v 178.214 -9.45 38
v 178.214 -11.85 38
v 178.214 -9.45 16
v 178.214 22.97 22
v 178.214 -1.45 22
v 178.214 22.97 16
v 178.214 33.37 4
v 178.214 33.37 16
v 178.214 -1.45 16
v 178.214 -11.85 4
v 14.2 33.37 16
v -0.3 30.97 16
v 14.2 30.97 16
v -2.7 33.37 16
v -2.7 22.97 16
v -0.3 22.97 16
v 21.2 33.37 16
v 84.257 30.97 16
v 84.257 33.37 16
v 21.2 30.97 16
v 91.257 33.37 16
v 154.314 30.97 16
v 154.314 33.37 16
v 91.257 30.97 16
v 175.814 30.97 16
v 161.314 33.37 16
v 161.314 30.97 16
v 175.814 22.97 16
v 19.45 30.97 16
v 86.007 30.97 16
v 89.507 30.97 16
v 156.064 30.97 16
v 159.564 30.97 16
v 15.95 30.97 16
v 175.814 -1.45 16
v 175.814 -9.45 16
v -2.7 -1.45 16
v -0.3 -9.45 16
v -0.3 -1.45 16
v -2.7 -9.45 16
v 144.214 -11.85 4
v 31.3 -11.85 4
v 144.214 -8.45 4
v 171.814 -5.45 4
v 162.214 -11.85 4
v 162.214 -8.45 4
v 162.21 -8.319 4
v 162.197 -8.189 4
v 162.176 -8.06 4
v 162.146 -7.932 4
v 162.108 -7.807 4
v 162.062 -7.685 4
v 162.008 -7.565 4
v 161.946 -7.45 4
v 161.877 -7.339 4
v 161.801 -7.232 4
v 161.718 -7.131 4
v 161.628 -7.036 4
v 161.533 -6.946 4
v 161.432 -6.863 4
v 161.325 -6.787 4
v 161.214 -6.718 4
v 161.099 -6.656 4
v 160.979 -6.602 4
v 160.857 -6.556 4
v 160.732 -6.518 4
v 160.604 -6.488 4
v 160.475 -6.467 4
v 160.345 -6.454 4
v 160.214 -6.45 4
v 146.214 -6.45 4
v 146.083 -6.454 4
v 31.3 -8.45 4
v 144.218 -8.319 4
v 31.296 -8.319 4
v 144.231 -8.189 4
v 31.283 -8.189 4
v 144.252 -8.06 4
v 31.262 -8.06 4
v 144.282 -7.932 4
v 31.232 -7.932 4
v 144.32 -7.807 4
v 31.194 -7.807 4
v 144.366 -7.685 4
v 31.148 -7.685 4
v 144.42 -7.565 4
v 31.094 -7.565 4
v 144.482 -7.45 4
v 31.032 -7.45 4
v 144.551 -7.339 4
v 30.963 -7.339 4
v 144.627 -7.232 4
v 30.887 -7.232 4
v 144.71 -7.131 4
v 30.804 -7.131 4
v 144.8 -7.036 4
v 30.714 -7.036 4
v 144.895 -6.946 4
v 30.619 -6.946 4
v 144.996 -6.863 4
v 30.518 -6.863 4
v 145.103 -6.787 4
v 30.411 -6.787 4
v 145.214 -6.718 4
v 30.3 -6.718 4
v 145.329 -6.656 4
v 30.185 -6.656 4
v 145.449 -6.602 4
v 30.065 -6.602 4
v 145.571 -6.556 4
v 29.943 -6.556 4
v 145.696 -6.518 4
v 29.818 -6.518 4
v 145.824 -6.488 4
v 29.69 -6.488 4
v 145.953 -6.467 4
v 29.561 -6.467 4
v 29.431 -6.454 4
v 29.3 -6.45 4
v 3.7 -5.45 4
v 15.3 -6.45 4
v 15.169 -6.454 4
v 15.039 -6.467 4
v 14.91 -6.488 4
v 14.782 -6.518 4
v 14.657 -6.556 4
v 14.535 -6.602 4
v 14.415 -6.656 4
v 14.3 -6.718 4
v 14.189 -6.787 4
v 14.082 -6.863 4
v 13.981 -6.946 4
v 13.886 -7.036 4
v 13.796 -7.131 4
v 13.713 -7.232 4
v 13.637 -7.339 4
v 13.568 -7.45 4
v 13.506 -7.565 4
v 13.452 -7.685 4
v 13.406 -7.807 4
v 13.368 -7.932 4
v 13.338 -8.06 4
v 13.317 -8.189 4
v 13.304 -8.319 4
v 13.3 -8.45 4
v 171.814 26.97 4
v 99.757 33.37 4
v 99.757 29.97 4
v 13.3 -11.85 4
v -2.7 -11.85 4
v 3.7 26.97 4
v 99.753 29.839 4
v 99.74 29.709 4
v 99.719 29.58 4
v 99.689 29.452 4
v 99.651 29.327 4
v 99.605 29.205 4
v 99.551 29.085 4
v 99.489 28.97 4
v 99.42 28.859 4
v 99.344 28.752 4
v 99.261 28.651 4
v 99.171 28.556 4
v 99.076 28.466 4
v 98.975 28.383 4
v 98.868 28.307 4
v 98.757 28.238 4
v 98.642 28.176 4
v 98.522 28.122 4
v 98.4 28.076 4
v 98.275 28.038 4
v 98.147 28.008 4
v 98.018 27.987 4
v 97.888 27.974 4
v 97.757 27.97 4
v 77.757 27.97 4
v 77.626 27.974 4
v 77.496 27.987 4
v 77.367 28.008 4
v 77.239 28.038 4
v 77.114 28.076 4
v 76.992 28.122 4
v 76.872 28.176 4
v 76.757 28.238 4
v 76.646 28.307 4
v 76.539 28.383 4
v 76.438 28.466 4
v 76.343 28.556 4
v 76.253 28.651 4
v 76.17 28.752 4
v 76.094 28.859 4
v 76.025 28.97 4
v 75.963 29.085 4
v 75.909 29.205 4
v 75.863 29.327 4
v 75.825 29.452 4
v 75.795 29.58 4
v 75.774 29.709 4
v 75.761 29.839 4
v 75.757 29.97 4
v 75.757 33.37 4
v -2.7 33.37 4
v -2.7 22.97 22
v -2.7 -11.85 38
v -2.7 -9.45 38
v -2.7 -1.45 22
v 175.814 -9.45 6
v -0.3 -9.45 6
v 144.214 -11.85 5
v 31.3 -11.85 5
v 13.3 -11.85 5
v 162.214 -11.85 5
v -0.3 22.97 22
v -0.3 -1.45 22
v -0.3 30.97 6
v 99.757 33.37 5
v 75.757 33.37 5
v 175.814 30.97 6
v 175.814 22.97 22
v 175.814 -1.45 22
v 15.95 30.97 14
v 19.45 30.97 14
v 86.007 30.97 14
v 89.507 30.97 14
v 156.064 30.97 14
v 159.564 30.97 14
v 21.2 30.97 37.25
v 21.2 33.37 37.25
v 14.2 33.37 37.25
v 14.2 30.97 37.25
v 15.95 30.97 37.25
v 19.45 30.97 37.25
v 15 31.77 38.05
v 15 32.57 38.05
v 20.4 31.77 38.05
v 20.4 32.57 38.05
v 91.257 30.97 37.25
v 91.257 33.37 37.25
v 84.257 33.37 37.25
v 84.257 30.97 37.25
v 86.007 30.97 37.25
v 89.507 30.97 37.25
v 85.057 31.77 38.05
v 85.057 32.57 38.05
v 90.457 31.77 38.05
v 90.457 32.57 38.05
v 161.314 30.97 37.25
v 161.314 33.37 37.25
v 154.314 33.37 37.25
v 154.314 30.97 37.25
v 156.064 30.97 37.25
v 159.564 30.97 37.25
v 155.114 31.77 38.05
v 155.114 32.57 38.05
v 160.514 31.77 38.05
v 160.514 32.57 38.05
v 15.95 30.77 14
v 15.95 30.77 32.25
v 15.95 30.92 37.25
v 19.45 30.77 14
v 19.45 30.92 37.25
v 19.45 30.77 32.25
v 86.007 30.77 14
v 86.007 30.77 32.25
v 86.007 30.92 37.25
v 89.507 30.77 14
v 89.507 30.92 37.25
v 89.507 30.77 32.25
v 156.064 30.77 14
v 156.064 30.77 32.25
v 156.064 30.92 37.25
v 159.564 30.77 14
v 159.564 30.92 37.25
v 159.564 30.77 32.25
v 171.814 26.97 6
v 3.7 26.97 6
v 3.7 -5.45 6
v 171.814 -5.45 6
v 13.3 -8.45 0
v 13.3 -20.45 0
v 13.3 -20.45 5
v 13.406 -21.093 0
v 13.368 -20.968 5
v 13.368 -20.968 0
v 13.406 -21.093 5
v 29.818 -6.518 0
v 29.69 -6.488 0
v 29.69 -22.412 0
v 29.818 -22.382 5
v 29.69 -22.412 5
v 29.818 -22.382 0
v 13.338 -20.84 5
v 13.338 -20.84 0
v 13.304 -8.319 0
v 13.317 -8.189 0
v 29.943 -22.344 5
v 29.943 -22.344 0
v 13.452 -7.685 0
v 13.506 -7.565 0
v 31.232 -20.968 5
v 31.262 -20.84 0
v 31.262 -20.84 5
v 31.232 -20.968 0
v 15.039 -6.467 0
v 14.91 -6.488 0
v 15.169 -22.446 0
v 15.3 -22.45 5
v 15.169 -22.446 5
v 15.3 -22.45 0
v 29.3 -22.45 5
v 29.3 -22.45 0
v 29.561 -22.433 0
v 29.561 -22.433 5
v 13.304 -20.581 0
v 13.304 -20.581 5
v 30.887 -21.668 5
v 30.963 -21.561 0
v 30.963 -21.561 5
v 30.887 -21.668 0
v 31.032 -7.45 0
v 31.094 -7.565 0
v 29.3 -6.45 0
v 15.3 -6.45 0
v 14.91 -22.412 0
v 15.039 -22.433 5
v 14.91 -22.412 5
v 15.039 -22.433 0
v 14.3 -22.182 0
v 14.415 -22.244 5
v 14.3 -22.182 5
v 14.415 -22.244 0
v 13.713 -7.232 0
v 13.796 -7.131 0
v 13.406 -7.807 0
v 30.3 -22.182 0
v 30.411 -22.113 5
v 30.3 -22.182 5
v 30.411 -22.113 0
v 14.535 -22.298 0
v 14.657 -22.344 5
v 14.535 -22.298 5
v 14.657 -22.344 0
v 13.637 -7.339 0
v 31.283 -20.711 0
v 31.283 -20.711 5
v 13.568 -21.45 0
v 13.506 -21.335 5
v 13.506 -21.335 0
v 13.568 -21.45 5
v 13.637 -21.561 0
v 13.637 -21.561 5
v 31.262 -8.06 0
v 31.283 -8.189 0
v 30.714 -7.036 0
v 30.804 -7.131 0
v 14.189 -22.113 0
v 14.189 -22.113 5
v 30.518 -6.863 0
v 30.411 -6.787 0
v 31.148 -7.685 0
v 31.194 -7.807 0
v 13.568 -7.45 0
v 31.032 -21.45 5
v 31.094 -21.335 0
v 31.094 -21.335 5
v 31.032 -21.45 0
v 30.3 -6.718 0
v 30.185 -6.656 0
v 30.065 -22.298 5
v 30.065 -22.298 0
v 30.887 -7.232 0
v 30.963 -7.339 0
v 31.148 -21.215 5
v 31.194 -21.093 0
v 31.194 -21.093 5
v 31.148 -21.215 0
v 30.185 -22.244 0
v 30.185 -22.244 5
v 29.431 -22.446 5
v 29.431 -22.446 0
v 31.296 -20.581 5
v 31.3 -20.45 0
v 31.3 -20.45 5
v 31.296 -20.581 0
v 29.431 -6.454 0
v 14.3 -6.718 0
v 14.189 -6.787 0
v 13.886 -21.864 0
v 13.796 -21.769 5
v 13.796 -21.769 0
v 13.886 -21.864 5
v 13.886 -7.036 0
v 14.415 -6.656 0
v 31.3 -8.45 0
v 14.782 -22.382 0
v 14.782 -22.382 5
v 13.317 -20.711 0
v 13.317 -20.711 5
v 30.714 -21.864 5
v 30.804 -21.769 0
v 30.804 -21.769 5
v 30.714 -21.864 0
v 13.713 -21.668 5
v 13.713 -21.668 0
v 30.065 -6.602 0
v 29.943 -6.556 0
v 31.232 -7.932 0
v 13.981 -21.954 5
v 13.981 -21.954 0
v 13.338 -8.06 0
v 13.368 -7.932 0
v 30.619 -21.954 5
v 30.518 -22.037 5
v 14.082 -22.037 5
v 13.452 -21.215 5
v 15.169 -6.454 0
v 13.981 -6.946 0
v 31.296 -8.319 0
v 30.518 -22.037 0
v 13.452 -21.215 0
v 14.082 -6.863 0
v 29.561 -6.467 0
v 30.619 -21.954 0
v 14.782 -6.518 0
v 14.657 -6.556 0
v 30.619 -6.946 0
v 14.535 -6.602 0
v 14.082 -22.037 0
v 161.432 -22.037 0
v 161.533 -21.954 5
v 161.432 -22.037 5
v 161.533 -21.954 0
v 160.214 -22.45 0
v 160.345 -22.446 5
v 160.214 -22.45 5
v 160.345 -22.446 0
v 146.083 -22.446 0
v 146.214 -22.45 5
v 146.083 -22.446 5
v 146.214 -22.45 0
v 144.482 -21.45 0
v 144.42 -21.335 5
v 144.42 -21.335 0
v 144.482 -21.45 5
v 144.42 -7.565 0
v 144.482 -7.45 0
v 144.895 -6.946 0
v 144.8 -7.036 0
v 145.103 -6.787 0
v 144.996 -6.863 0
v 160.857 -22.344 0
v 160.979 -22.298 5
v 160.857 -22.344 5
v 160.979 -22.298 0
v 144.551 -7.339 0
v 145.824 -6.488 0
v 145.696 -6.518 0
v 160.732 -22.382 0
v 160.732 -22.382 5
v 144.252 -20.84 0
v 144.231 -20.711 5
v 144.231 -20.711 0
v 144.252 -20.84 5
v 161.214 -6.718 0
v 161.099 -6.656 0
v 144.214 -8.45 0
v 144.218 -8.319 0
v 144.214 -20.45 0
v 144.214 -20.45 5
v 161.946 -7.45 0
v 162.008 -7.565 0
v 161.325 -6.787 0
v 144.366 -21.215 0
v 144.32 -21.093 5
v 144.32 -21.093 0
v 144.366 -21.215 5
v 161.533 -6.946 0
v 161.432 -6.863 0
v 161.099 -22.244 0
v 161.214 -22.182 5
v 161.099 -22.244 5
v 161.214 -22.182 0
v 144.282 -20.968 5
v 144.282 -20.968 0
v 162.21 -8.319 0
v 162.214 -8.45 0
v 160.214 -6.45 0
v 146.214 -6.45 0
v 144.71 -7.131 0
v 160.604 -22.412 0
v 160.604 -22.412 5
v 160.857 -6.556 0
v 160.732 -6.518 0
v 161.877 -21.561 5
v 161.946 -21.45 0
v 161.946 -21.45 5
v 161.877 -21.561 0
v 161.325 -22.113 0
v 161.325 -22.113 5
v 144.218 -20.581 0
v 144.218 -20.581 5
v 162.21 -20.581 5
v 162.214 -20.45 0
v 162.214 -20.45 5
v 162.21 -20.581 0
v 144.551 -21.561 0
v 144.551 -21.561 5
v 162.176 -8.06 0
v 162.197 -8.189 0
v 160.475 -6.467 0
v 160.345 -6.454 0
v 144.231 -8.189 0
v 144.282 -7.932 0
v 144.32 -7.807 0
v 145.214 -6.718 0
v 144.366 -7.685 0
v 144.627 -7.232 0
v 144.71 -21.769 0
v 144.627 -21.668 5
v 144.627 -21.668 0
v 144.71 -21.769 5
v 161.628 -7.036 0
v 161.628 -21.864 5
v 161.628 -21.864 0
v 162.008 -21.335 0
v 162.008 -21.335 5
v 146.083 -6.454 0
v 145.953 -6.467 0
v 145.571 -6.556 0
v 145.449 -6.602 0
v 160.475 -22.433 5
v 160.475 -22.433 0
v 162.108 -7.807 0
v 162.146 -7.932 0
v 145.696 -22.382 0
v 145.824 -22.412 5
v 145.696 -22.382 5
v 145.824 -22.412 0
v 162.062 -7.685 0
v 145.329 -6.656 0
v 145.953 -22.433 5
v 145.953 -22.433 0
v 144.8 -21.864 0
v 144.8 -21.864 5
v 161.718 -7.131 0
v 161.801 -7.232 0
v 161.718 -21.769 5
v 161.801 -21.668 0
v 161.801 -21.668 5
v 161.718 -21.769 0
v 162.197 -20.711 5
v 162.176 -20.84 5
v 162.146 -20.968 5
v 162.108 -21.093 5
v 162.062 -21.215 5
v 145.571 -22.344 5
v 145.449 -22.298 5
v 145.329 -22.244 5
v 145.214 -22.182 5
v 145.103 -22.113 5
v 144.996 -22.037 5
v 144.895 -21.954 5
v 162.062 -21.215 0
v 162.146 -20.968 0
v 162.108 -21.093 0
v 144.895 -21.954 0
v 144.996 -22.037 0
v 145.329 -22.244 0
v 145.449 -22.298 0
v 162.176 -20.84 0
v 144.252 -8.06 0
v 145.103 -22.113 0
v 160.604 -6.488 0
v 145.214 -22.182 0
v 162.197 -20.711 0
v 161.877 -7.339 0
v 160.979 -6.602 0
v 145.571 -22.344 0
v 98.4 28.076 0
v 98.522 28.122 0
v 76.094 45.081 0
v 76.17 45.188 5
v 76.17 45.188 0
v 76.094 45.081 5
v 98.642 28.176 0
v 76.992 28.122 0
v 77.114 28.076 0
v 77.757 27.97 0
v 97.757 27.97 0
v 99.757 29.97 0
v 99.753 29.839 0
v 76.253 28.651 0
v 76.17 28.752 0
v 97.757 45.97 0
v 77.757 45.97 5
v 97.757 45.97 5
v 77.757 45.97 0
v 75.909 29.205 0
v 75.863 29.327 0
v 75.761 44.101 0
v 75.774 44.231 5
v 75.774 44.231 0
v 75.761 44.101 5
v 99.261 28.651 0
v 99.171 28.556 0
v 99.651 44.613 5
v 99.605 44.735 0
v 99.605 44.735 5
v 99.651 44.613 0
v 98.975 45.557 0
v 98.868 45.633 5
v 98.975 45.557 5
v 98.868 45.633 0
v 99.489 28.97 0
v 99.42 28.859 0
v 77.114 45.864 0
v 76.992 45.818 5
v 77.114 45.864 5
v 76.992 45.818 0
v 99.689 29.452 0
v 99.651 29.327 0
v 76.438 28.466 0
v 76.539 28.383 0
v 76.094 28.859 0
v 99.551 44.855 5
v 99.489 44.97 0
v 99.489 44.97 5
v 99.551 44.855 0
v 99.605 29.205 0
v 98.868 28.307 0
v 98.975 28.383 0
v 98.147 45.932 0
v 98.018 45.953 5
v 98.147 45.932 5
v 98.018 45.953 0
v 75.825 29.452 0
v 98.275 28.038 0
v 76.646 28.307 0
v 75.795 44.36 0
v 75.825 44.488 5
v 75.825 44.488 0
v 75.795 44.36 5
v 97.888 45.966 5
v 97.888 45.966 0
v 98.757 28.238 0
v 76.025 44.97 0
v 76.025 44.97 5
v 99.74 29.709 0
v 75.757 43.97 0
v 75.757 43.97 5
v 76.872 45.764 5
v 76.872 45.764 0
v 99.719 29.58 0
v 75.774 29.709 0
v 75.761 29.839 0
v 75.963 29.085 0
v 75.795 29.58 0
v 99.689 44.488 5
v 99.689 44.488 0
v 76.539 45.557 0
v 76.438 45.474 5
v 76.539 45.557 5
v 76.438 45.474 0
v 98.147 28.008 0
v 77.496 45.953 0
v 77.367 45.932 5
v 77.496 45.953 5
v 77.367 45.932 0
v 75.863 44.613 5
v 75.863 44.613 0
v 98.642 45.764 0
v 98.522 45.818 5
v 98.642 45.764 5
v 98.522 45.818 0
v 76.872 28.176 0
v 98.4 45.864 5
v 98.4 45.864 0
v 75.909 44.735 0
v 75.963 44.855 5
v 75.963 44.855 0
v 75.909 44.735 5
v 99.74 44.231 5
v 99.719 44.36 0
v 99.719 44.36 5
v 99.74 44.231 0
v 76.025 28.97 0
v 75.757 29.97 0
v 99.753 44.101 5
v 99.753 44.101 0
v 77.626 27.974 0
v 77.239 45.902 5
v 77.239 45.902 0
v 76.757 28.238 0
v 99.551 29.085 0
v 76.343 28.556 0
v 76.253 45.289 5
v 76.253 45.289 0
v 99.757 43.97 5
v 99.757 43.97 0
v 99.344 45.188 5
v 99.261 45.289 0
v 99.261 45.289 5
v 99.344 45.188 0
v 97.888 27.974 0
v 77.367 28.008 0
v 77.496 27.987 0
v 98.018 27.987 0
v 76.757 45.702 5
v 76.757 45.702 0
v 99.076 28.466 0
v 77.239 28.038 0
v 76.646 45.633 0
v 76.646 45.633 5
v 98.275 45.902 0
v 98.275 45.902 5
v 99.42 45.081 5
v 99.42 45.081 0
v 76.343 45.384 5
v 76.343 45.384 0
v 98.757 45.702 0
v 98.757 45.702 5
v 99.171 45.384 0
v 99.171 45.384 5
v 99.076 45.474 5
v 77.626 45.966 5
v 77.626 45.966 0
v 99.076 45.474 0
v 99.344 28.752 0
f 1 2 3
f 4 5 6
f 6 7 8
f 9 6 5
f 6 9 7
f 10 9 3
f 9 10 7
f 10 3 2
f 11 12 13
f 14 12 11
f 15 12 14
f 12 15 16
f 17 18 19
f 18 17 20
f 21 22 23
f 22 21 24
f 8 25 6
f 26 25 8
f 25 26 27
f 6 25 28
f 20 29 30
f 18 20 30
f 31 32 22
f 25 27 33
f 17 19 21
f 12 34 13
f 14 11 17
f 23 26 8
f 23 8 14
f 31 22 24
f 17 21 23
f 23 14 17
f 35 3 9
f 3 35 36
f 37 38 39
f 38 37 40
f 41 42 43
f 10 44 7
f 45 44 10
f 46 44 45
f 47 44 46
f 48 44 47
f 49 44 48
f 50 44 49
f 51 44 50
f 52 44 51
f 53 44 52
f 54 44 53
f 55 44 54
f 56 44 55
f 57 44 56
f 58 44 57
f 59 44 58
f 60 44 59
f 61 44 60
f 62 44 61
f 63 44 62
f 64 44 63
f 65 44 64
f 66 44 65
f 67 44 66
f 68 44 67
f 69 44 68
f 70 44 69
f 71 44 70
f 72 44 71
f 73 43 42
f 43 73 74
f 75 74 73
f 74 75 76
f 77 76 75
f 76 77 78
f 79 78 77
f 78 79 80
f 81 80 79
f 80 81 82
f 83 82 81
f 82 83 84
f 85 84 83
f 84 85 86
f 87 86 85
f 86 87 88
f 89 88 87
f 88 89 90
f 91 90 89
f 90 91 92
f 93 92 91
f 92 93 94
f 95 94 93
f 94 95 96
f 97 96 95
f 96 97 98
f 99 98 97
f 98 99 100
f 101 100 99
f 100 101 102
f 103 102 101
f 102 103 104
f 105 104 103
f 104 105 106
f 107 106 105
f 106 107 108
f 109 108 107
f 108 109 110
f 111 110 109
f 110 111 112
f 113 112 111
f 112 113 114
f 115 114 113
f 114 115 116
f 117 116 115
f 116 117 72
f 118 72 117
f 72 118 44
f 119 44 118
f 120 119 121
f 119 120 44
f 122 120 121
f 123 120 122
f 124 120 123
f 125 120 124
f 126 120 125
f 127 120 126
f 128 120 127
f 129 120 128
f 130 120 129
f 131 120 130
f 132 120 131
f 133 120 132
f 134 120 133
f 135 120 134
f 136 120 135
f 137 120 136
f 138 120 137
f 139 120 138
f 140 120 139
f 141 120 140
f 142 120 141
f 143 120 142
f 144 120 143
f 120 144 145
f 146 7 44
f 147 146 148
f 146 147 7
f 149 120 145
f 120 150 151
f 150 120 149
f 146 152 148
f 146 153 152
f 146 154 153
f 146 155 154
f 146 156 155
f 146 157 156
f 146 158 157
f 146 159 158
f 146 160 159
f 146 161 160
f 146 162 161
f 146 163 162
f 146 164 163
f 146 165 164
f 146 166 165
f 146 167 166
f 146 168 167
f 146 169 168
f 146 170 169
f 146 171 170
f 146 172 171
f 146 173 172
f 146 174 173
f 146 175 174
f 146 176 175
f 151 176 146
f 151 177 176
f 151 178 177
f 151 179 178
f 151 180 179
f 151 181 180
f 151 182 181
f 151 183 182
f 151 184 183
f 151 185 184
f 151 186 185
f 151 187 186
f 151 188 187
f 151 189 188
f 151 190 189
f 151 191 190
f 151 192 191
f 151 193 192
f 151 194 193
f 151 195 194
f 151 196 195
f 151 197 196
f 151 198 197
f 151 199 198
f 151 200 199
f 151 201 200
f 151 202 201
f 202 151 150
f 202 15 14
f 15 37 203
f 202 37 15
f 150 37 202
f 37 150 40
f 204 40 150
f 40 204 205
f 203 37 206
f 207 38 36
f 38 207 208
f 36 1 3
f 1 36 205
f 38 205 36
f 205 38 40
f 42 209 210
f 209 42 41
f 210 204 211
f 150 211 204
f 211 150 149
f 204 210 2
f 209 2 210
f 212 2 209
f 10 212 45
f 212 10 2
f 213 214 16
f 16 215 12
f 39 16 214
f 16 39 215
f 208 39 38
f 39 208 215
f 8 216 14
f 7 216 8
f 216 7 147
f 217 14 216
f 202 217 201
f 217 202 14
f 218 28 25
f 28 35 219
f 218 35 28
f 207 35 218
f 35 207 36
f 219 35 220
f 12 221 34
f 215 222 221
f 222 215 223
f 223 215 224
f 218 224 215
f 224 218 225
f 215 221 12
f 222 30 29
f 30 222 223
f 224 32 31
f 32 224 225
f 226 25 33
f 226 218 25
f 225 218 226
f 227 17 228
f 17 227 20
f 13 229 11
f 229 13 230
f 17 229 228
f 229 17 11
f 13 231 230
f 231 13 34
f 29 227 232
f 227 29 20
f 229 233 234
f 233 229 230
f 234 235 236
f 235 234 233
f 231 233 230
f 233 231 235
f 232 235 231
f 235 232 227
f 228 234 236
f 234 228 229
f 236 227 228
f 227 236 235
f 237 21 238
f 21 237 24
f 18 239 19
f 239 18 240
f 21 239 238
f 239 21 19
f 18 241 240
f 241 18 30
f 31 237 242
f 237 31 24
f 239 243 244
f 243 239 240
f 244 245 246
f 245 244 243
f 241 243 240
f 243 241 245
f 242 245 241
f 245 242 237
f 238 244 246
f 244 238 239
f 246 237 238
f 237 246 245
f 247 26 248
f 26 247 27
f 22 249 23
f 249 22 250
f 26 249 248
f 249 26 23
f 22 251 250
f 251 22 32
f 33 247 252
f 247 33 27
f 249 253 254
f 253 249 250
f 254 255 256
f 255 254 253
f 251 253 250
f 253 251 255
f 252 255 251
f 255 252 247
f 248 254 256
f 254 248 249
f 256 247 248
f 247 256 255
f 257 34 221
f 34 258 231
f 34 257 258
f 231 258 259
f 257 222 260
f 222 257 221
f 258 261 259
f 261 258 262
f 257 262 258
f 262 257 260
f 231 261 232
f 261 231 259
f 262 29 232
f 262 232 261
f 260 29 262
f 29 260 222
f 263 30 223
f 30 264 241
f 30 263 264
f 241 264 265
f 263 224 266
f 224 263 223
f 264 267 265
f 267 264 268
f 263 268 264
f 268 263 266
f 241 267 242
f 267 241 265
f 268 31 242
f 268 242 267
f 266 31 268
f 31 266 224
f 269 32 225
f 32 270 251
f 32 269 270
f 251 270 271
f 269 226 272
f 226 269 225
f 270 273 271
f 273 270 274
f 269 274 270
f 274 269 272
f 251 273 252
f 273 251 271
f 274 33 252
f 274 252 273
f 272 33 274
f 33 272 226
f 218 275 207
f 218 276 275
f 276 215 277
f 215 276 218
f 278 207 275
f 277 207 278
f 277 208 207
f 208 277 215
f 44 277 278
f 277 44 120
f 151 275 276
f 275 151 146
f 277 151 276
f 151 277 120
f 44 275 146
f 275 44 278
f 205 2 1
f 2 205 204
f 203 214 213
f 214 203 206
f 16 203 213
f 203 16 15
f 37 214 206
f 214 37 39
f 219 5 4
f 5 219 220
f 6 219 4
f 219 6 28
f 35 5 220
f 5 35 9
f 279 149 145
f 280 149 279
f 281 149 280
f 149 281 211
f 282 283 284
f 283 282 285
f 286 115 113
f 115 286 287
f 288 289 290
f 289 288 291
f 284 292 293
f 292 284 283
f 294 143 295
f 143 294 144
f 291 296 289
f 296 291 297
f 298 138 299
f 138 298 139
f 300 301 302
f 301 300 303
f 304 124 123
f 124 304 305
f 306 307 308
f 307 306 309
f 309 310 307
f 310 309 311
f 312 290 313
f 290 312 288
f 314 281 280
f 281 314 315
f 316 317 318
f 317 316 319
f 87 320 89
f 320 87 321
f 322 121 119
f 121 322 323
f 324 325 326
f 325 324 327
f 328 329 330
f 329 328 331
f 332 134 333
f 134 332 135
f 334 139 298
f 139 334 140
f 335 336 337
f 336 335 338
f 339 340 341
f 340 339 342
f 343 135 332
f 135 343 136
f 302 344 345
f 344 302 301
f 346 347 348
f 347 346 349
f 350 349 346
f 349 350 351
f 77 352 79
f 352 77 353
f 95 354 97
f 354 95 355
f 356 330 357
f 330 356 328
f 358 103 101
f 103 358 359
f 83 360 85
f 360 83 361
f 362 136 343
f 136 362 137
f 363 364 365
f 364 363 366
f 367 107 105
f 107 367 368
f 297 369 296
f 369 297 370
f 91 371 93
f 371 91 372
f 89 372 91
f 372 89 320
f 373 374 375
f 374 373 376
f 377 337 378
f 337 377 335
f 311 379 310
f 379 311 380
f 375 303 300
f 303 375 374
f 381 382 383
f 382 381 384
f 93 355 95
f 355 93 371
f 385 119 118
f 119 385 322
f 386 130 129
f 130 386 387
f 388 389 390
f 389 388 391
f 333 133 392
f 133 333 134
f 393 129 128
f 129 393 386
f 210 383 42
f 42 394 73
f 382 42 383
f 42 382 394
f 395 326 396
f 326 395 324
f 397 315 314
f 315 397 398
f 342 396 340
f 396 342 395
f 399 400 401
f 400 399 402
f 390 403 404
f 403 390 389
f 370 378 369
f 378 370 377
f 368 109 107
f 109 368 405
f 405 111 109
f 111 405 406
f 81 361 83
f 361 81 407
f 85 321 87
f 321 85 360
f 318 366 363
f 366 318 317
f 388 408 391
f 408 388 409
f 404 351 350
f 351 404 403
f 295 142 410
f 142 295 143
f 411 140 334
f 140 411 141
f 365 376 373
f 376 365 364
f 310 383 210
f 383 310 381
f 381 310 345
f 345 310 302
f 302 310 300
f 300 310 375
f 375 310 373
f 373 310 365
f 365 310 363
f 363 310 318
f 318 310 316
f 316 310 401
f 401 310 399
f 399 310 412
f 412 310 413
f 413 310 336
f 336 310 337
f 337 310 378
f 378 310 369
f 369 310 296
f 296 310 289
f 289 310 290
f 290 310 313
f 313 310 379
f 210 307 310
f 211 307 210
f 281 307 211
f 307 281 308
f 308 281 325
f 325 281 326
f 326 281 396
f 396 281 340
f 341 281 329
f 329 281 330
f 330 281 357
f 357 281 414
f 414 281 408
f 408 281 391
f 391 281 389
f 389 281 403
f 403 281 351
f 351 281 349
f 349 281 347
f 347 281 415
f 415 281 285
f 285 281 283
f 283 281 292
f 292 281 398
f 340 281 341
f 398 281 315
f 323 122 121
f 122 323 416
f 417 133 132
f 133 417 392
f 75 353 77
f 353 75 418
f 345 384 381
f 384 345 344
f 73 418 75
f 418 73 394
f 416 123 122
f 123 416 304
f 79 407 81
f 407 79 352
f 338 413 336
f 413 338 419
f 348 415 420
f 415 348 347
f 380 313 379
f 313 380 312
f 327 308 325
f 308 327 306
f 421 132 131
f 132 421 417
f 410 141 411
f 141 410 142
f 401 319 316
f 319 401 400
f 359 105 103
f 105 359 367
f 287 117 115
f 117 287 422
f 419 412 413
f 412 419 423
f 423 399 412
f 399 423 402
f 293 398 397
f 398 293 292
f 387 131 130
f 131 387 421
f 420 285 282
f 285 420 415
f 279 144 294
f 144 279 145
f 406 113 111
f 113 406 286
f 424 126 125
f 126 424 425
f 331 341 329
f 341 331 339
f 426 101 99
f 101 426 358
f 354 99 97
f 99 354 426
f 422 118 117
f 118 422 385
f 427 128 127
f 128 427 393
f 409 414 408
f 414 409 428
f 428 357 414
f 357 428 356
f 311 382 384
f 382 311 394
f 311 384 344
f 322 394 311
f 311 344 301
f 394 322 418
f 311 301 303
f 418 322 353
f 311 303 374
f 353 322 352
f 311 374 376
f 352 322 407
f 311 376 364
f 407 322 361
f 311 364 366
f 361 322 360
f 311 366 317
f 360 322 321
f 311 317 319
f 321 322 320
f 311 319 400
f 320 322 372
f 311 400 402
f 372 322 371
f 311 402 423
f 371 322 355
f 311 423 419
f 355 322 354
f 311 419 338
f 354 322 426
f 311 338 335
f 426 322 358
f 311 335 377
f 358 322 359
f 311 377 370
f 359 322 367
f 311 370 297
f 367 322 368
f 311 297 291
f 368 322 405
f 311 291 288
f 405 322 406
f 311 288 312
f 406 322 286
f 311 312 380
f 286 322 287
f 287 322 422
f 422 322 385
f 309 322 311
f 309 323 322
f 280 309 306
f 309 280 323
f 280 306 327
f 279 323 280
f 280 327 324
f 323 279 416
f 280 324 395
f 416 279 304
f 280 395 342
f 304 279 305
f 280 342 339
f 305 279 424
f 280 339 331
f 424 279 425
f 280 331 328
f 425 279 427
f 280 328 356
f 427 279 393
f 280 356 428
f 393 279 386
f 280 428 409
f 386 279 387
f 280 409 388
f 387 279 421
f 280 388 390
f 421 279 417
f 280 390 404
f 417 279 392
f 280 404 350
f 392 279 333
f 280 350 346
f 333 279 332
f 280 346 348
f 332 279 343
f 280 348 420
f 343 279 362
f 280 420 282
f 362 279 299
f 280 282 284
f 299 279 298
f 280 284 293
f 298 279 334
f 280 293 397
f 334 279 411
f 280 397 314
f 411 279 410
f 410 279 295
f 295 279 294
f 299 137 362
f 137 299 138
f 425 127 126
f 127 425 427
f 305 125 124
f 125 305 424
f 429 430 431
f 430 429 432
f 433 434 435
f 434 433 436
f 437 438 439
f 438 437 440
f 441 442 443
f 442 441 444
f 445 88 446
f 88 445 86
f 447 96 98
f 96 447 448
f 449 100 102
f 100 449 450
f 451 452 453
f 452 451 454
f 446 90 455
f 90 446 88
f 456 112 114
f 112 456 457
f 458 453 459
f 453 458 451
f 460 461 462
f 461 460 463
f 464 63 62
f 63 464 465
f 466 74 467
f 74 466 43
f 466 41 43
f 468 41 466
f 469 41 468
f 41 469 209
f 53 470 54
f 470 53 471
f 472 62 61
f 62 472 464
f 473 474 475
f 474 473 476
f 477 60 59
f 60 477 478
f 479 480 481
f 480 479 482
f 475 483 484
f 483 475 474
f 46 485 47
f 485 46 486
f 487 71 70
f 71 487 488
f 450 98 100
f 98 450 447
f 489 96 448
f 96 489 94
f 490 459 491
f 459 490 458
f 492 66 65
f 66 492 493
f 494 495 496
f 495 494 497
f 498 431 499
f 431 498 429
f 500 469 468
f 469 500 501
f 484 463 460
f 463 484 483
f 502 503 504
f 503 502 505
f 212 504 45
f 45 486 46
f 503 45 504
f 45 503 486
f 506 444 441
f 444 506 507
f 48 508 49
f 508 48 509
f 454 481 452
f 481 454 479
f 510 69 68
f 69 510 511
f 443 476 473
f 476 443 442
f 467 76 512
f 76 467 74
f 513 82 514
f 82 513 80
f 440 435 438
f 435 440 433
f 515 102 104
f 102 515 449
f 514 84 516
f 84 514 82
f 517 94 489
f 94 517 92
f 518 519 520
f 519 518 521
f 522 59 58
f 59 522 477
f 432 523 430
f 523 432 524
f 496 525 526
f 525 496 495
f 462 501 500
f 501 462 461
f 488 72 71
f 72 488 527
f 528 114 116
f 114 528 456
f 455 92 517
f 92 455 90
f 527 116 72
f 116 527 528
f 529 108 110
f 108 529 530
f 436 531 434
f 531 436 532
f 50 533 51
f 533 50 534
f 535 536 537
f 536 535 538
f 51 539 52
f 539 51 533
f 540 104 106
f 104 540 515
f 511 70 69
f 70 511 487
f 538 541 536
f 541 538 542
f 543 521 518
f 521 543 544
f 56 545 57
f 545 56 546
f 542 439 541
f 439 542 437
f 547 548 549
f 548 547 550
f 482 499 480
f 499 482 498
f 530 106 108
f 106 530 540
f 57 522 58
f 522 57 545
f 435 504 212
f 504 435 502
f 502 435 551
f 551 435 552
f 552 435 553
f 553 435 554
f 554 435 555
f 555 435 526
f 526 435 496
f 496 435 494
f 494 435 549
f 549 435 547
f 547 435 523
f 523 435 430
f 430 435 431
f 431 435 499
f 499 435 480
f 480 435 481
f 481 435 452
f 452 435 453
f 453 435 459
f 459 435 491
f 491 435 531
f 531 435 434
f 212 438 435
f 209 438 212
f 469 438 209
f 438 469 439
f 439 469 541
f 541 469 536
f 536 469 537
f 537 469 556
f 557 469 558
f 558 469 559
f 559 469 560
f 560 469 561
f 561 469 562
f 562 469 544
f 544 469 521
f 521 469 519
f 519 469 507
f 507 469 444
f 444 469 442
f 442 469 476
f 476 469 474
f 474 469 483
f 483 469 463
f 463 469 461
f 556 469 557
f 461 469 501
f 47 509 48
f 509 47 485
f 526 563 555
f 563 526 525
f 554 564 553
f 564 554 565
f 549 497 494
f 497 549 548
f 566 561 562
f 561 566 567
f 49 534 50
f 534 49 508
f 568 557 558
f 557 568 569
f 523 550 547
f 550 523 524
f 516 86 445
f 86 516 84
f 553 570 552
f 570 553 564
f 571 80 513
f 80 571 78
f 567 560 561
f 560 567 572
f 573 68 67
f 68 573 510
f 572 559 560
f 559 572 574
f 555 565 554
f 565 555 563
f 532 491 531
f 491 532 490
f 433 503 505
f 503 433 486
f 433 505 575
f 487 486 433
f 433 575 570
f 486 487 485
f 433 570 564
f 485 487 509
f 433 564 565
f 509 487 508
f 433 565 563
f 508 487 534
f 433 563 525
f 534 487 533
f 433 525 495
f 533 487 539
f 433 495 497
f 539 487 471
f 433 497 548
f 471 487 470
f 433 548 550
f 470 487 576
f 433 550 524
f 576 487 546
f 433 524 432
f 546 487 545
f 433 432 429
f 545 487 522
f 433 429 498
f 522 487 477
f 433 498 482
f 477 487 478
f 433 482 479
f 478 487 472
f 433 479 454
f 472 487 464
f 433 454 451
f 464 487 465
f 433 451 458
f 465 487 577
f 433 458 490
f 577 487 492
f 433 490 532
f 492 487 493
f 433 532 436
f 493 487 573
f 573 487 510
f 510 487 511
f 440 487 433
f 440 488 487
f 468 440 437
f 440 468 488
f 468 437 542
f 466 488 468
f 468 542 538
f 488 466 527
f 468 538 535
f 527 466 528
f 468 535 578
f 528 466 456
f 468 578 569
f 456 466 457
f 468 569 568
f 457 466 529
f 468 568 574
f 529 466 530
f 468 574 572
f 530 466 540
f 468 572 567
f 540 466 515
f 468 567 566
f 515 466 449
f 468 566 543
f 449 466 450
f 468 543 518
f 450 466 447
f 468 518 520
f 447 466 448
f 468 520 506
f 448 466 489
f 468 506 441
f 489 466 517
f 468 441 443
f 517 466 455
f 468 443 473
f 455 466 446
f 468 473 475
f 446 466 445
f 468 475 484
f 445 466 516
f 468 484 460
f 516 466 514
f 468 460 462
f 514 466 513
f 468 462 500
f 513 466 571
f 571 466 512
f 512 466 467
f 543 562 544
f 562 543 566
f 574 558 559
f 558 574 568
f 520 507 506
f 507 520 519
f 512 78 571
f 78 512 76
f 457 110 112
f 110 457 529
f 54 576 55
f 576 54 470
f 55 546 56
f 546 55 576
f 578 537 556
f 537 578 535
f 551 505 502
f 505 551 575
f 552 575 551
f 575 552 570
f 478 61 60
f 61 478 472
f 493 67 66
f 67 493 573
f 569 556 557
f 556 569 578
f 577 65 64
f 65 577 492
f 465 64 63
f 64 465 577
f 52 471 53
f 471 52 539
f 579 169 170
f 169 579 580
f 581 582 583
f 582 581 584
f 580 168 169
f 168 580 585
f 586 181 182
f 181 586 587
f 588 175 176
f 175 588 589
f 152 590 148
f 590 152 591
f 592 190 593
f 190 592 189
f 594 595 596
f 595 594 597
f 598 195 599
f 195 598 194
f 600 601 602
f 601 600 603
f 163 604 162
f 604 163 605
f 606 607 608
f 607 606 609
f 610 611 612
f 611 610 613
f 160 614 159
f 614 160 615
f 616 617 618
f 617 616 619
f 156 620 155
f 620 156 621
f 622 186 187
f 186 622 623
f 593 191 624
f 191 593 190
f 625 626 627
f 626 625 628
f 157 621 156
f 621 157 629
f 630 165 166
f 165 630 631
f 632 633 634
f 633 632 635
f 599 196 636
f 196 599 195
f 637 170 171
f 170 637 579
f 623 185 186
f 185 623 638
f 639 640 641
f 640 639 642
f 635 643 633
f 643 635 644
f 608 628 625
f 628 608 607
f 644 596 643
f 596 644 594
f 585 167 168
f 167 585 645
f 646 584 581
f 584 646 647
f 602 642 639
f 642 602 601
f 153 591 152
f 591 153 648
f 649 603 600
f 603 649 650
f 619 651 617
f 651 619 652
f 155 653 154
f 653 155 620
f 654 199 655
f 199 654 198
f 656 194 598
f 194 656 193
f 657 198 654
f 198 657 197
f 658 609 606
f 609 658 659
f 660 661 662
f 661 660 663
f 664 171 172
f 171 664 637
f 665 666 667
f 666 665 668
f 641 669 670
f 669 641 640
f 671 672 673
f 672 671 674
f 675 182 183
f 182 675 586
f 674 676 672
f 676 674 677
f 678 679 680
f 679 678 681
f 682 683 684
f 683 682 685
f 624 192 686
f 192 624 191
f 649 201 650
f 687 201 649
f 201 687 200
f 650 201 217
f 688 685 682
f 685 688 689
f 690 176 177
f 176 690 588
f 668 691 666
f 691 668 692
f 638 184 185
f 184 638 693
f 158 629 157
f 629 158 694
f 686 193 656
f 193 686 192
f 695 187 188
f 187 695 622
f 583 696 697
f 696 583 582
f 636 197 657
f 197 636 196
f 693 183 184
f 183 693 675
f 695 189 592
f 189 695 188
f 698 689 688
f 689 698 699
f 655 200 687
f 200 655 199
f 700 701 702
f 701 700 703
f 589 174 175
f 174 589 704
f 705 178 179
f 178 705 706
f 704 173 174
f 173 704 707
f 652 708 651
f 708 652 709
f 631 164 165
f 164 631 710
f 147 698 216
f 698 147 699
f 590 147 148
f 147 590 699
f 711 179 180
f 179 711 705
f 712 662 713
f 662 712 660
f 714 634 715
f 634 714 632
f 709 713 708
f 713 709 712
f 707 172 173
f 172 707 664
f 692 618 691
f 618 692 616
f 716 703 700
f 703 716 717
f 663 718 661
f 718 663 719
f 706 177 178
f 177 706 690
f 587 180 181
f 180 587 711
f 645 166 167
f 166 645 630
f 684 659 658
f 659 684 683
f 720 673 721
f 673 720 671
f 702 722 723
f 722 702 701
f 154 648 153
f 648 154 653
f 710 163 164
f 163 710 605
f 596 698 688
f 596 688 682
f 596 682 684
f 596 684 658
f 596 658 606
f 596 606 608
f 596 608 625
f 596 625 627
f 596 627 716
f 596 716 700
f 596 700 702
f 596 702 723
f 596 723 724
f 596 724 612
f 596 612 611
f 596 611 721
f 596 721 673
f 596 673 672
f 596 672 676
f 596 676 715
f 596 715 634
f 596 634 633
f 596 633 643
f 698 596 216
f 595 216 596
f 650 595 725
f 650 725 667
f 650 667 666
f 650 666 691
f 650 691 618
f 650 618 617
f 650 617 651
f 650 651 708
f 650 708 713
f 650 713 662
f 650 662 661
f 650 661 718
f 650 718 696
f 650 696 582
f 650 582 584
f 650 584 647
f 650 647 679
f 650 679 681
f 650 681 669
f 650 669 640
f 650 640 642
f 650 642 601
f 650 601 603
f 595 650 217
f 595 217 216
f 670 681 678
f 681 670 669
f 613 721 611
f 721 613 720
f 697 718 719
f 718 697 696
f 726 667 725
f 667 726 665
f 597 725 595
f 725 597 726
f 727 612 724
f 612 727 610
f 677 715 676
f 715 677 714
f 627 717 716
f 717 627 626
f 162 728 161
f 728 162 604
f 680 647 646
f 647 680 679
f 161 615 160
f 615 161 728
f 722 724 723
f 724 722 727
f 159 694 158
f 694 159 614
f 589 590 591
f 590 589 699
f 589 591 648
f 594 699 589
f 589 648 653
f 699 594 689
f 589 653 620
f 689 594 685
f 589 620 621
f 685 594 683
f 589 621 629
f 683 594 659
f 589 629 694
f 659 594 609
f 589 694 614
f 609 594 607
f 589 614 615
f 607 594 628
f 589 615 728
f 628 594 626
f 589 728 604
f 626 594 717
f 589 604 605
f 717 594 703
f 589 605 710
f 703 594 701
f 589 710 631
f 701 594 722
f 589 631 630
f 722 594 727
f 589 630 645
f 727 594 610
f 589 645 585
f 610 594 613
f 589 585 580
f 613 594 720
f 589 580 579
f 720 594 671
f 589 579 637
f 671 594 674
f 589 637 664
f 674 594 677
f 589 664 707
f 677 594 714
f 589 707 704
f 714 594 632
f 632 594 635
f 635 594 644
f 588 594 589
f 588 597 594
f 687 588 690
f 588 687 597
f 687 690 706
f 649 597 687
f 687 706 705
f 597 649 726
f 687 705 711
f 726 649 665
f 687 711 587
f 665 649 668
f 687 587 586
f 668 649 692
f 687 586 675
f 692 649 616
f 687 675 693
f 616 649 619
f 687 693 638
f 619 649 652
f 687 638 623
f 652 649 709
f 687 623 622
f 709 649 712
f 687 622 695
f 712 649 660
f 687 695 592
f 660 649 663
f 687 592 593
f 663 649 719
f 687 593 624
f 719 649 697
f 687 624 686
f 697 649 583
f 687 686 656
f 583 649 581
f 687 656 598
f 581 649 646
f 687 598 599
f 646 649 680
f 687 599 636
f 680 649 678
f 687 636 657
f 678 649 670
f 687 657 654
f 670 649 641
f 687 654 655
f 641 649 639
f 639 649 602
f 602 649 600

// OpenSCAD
// DOUBLE TAKE FRAMES DESIGN RELEASE
// DTF_RELEASE: 2.0.4
// Released: 2026-09-15
// Versioning: Semantic Versioning 2.0.0 (https://semver.org/)
// Status: CANONICAL
// Changes in 2.0.4:
// - Carried forward unchanged for the coordinated capstan and clock-string-guide release.
// Changes in 2.0.3:
// - Carried forward unchanged for the corrected prepared-project packaging.
// Changes in 2.0.2:
// - Carried forward unchanged for the native 3MF packaging hotfix.
// Changes in 2.0.1:
// - Carried forward unchanged for the prepared-project packaging correction.
// Changes in 2.0.0:
// - Carried forward without geometry changes for the coordinated 2.0.0 release.
// Full release notes: https://doubletakeframes.com/build/#design-release
//
$fn = 96;
eps = 0.05;

// =========================================================
// DETACHABLE FRONT BAND + SIDE WALLS + REAR POSTS + FEETS
// Continuous low rail all around.
// Side walls sit on rail but do not connect to front/back above rail.
// Non-friction resting fit.
//
// Corrected:
// - Feet overlap collar/body in Z by foot_body_z_overlap, not just eps.
// - Each foot is shifted a few mm inward under the basket while keeping
//   the original front/rear foot depth.
// =========================================================

inch = 25.4;

// CASSETTE REFERENCE VALUES
cassette_w = 6.91 * inch;

bottom_t    = 3.0;
wall_t      = 3.0;
wall_offset = 0.0;

front_frame_t    = 1.2;
acrylic_gap      = 1.0;
spacer_thickness = 7.0;

front_buildout_total = front_frame_t + acrylic_gap + spacer_thickness;
front_buildout_y0    = wall_offset - front_buildout_total;

roller_r    = 0.75 * inch;
glide_t     = 2.0;
fang_embed  = 0.6;
rail_back_y = 8.0;
roller_cy   = wall_offset + wall_t;

glide_y  = roller_cy + roller_r - glide_t - fang_embed;
bottom_d = glide_y + glide_t + rail_back_y;

backing_board_extra_y = 1/20 * inch;

cassette_x0 = 0;
cassette_x1 = cassette_w;
cassette_y0 = front_buildout_y0;
cassette_y1 = bottom_d + backing_board_extra_y;

// FIT / GEOMETRY
clear_x = 0.3;
clear_y = 0.25;

collar_t = 2.4;

foot_h = 5.0;
foot_body_z_overlap = 1.0;
collar_z0 = foot_h - foot_body_z_overlap;

collar_h = 34.0;
side_wall_h = 18.0;
inner_x0 = cassette_x0 - clear_x;
inner_x1 = cassette_x1 + clear_x;
inner_y0 = cassette_y0 - clear_y;
inner_y1 = cassette_y1 + clear_y;

outer_x0 = inner_x0 - collar_t;
outer_x1 = inner_x1 + collar_t;
outer_y0 = inner_y0 - collar_t;
outer_y1 = inner_y1 + collar_t;

// RESTING LEDGE
rest_lip_t = 4.0;
rest_lip_h = 2.0;

// LOW RAIL
low_rail_h = 12.0;

// SIDE WALLS
side_wall_gap_front = 8.0;
side_wall_gap_rear  = 8.0;
side_wall_t = collar_t;

// REAR POSTS
rear_post_w = 7.0;
rear_post_t = collar_t;
post_bevel = 0.8;

// Localized friction take-up on the three rear backing-board capture posts.
// These project into the existing Y clearance without moving the posts or
// tightening the stand's overall envelope. The upper ramp eases insertion.
rear_post_friction_pad_d = 0.20;
rear_post_friction_pad_w = 3.5;
rear_post_friction_pad_z0 = collar_z0 + low_rail_h - 2.0;
rear_post_friction_pad_z1 = collar_z0 + collar_h - post_bevel;
rear_post_friction_ramp_h = 5.0;

// FEET
front_foot_proj = 16.0;
rear_foot_proj  = 18.0;

front_foot_w = 18.0;
rear_foot_w  = 24.0;

front_foot_inset_x = 16.0;
foot_round = 2.0;

// How far the inner edge of each foot reaches under the basket.
// Original effectively stopped ~0.6 mm short of the inner edge.
foot_y_overlap = 3.0;

// HELPERS
module rounded_rect_prism(x0, x1, y0, y1, z0, z1, r=2) {
    hull() {
        translate([x0+r, y0+r, z0]) cylinder(r=r, h=z1-z0);
        translate([x1-r, y0+r, z0]) cylinder(r=r, h=z1-z0);
        translate([x0+r, y1-r, z0]) cylinder(r=r, h=z1-z0);
        translate([x1-r, y1-r, z0]) cylinder(r=r, h=z1-z0);
    }
}

module beveled_post(xsz, ysz, h, b) {
    bx = min(b, xsz/2 - eps);
    by = min(b, ysz/2 - eps);

    union() {
        cube([xsz, ysz, h - b]);

        translate([0, 0, h - b])
        hull() {
            cube([xsz, ysz, eps]);

            translate([bx, by, b])
                cube([
                    max(eps, xsz - 2*bx),
                    max(eps, ysz - 2*by),
                    eps
                ]);
        }
    }
}

// FRONT BAND
module front_band() {
    translate([outer_x0, outer_y0, collar_z0])
        cube([
            outer_x1 - outer_x0,
            collar_t,
            collar_h
        ]);
}

// CONTINUOUS LOW RAIL
module front_low_rail() {
    translate([outer_x0, outer_y0, collar_z0])
        cube([outer_x1 - outer_x0, collar_t, low_rail_h]);
}

module left_low_rail() {
    translate([outer_x0, outer_y0, collar_z0])
        cube([collar_t, outer_y1 - outer_y0, low_rail_h]);
}

module right_low_rail() {
    translate([outer_x1 - collar_t, outer_y0, collar_z0])
        cube([collar_t, outer_y1 - outer_y0, low_rail_h]);
}

module rear_low_rail() {
    translate([outer_x0, outer_y1 - collar_t, collar_z0])
        cube([outer_x1 - outer_x0, collar_t, low_rail_h]);
}

module low_rails() {
    // front rail overlaps lower part of front band; harmless and strengthens base
    front_low_rail();
    left_low_rail();
    right_low_rail();
    rear_low_rail();
}

// SIDE WALLS
module left_side_wall() {
    y0 = inner_y0 + side_wall_gap_front;
    y1 = inner_y1 - side_wall_gap_rear;

    translate([outer_x0, y0, collar_z0])
        cube([
            side_wall_t,
            y1 - y0,
            side_wall_h
        ]);
}

module right_side_wall() {
    y0 = inner_y0 + side_wall_gap_front;
    y1 = inner_y1 - side_wall_gap_rear;

    translate([inner_x1, y0, collar_z0])
        cube([
            side_wall_t,
            y1 - y0,
            side_wall_h
        ]);
}

// REAR POSTS
module rear_post(x_center) {
    translate([x_center - rear_post_w/2, inner_y1, collar_z0])
        beveled_post(rear_post_w, rear_post_t, collar_h, post_bevel);
}

module rear_post_friction_pad(x_center) {
    pad_x0 = x_center - rear_post_friction_pad_w/2;
    full_pad_y0 = inner_y1 - rear_post_friction_pad_d;
    ramp_z0 = rear_post_friction_pad_z1 - rear_post_friction_ramp_h;

    hull() {
        translate([pad_x0, full_pad_y0, rear_post_friction_pad_z0])
            cube([rear_post_friction_pad_w, rear_post_friction_pad_d + eps, eps]);
        translate([pad_x0, full_pad_y0, ramp_z0])
            cube([rear_post_friction_pad_w, rear_post_friction_pad_d + eps, eps]);
        translate([pad_x0, inner_y1 - eps, rear_post_friction_pad_z1])
            cube([rear_post_friction_pad_w, 2*eps, eps]);
    }
}

module rear_posts() {
    left_post_x = inner_x0 + 18.0;
    center_post_x = (inner_x0 + inner_x1) / 2;
    right_post_x = inner_x1 - 18.0;

    rear_post(left_post_x);
    rear_post(center_post_x);
    rear_post(right_post_x);

    rear_post_friction_pad(left_post_x);
    rear_post_friction_pad(center_post_x);
    rear_post_friction_pad(right_post_x);
}

// BOTTOM RESTING LEDGE
module bottom_rest_lip() {
    translate([inner_x0, inner_y0, collar_z0])
        cube([inner_x1 - inner_x0, rest_lip_t, rest_lip_h]);

    translate([inner_x0, inner_y1 - rest_lip_t, collar_z0])
        cube([inner_x1 - inner_x0, rest_lip_t, rest_lip_h]);

    translate([inner_x0, inner_y0, collar_z0])
        cube([rest_lip_t, inner_y1 - inner_y0, rest_lip_h]);

    translate([inner_x1 - rest_lip_t, inner_y0, collar_z0])
        cube([rest_lip_t, inner_y1 - inner_y0, rest_lip_h]);
}

// FEET
module front_left_foot() {
    x0 = outer_x0 + front_foot_inset_x;
    x1 = x0 + front_foot_w;

    // Same foot depth as original, shifted inward for a few mm of underlap.
    y1 = inner_y0 + foot_y_overlap;
    y0 = y1 - front_foot_proj;

    rounded_rect_prism(x0, x1, y0, y1, 0, foot_h, foot_round);
}

module front_right_foot() {
    x1 = outer_x1 - front_foot_inset_x;
    x0 = x1 - front_foot_w;

    // Same foot depth as original, shifted inward for a few mm of underlap.
    y1 = inner_y0 + foot_y_overlap;
    y0 = y1 - front_foot_proj;

    rounded_rect_prism(x0, x1, y0, y1, 0, foot_h, foot_round);
}

module rear_center_foot() {
    x0 = (outer_x0 + outer_x1)/2 - rear_foot_w/2;
    x1 = x0 + rear_foot_w;

    // Same foot depth as original, shifted inward for a few mm of underlap.
    y0 = inner_y1 - foot_y_overlap;
    y1 = y0 + rear_foot_proj;

    rounded_rect_prism(x0, x1, y0, y1, 0, foot_h, foot_round);
}

// FINAL
union() {
    front_band();
    low_rails();

    left_side_wall();
    right_side_wall();
    rear_posts();

    bottom_rest_lip();

    front_left_foot();
    front_right_foot();
    rear_center_foot();
}
